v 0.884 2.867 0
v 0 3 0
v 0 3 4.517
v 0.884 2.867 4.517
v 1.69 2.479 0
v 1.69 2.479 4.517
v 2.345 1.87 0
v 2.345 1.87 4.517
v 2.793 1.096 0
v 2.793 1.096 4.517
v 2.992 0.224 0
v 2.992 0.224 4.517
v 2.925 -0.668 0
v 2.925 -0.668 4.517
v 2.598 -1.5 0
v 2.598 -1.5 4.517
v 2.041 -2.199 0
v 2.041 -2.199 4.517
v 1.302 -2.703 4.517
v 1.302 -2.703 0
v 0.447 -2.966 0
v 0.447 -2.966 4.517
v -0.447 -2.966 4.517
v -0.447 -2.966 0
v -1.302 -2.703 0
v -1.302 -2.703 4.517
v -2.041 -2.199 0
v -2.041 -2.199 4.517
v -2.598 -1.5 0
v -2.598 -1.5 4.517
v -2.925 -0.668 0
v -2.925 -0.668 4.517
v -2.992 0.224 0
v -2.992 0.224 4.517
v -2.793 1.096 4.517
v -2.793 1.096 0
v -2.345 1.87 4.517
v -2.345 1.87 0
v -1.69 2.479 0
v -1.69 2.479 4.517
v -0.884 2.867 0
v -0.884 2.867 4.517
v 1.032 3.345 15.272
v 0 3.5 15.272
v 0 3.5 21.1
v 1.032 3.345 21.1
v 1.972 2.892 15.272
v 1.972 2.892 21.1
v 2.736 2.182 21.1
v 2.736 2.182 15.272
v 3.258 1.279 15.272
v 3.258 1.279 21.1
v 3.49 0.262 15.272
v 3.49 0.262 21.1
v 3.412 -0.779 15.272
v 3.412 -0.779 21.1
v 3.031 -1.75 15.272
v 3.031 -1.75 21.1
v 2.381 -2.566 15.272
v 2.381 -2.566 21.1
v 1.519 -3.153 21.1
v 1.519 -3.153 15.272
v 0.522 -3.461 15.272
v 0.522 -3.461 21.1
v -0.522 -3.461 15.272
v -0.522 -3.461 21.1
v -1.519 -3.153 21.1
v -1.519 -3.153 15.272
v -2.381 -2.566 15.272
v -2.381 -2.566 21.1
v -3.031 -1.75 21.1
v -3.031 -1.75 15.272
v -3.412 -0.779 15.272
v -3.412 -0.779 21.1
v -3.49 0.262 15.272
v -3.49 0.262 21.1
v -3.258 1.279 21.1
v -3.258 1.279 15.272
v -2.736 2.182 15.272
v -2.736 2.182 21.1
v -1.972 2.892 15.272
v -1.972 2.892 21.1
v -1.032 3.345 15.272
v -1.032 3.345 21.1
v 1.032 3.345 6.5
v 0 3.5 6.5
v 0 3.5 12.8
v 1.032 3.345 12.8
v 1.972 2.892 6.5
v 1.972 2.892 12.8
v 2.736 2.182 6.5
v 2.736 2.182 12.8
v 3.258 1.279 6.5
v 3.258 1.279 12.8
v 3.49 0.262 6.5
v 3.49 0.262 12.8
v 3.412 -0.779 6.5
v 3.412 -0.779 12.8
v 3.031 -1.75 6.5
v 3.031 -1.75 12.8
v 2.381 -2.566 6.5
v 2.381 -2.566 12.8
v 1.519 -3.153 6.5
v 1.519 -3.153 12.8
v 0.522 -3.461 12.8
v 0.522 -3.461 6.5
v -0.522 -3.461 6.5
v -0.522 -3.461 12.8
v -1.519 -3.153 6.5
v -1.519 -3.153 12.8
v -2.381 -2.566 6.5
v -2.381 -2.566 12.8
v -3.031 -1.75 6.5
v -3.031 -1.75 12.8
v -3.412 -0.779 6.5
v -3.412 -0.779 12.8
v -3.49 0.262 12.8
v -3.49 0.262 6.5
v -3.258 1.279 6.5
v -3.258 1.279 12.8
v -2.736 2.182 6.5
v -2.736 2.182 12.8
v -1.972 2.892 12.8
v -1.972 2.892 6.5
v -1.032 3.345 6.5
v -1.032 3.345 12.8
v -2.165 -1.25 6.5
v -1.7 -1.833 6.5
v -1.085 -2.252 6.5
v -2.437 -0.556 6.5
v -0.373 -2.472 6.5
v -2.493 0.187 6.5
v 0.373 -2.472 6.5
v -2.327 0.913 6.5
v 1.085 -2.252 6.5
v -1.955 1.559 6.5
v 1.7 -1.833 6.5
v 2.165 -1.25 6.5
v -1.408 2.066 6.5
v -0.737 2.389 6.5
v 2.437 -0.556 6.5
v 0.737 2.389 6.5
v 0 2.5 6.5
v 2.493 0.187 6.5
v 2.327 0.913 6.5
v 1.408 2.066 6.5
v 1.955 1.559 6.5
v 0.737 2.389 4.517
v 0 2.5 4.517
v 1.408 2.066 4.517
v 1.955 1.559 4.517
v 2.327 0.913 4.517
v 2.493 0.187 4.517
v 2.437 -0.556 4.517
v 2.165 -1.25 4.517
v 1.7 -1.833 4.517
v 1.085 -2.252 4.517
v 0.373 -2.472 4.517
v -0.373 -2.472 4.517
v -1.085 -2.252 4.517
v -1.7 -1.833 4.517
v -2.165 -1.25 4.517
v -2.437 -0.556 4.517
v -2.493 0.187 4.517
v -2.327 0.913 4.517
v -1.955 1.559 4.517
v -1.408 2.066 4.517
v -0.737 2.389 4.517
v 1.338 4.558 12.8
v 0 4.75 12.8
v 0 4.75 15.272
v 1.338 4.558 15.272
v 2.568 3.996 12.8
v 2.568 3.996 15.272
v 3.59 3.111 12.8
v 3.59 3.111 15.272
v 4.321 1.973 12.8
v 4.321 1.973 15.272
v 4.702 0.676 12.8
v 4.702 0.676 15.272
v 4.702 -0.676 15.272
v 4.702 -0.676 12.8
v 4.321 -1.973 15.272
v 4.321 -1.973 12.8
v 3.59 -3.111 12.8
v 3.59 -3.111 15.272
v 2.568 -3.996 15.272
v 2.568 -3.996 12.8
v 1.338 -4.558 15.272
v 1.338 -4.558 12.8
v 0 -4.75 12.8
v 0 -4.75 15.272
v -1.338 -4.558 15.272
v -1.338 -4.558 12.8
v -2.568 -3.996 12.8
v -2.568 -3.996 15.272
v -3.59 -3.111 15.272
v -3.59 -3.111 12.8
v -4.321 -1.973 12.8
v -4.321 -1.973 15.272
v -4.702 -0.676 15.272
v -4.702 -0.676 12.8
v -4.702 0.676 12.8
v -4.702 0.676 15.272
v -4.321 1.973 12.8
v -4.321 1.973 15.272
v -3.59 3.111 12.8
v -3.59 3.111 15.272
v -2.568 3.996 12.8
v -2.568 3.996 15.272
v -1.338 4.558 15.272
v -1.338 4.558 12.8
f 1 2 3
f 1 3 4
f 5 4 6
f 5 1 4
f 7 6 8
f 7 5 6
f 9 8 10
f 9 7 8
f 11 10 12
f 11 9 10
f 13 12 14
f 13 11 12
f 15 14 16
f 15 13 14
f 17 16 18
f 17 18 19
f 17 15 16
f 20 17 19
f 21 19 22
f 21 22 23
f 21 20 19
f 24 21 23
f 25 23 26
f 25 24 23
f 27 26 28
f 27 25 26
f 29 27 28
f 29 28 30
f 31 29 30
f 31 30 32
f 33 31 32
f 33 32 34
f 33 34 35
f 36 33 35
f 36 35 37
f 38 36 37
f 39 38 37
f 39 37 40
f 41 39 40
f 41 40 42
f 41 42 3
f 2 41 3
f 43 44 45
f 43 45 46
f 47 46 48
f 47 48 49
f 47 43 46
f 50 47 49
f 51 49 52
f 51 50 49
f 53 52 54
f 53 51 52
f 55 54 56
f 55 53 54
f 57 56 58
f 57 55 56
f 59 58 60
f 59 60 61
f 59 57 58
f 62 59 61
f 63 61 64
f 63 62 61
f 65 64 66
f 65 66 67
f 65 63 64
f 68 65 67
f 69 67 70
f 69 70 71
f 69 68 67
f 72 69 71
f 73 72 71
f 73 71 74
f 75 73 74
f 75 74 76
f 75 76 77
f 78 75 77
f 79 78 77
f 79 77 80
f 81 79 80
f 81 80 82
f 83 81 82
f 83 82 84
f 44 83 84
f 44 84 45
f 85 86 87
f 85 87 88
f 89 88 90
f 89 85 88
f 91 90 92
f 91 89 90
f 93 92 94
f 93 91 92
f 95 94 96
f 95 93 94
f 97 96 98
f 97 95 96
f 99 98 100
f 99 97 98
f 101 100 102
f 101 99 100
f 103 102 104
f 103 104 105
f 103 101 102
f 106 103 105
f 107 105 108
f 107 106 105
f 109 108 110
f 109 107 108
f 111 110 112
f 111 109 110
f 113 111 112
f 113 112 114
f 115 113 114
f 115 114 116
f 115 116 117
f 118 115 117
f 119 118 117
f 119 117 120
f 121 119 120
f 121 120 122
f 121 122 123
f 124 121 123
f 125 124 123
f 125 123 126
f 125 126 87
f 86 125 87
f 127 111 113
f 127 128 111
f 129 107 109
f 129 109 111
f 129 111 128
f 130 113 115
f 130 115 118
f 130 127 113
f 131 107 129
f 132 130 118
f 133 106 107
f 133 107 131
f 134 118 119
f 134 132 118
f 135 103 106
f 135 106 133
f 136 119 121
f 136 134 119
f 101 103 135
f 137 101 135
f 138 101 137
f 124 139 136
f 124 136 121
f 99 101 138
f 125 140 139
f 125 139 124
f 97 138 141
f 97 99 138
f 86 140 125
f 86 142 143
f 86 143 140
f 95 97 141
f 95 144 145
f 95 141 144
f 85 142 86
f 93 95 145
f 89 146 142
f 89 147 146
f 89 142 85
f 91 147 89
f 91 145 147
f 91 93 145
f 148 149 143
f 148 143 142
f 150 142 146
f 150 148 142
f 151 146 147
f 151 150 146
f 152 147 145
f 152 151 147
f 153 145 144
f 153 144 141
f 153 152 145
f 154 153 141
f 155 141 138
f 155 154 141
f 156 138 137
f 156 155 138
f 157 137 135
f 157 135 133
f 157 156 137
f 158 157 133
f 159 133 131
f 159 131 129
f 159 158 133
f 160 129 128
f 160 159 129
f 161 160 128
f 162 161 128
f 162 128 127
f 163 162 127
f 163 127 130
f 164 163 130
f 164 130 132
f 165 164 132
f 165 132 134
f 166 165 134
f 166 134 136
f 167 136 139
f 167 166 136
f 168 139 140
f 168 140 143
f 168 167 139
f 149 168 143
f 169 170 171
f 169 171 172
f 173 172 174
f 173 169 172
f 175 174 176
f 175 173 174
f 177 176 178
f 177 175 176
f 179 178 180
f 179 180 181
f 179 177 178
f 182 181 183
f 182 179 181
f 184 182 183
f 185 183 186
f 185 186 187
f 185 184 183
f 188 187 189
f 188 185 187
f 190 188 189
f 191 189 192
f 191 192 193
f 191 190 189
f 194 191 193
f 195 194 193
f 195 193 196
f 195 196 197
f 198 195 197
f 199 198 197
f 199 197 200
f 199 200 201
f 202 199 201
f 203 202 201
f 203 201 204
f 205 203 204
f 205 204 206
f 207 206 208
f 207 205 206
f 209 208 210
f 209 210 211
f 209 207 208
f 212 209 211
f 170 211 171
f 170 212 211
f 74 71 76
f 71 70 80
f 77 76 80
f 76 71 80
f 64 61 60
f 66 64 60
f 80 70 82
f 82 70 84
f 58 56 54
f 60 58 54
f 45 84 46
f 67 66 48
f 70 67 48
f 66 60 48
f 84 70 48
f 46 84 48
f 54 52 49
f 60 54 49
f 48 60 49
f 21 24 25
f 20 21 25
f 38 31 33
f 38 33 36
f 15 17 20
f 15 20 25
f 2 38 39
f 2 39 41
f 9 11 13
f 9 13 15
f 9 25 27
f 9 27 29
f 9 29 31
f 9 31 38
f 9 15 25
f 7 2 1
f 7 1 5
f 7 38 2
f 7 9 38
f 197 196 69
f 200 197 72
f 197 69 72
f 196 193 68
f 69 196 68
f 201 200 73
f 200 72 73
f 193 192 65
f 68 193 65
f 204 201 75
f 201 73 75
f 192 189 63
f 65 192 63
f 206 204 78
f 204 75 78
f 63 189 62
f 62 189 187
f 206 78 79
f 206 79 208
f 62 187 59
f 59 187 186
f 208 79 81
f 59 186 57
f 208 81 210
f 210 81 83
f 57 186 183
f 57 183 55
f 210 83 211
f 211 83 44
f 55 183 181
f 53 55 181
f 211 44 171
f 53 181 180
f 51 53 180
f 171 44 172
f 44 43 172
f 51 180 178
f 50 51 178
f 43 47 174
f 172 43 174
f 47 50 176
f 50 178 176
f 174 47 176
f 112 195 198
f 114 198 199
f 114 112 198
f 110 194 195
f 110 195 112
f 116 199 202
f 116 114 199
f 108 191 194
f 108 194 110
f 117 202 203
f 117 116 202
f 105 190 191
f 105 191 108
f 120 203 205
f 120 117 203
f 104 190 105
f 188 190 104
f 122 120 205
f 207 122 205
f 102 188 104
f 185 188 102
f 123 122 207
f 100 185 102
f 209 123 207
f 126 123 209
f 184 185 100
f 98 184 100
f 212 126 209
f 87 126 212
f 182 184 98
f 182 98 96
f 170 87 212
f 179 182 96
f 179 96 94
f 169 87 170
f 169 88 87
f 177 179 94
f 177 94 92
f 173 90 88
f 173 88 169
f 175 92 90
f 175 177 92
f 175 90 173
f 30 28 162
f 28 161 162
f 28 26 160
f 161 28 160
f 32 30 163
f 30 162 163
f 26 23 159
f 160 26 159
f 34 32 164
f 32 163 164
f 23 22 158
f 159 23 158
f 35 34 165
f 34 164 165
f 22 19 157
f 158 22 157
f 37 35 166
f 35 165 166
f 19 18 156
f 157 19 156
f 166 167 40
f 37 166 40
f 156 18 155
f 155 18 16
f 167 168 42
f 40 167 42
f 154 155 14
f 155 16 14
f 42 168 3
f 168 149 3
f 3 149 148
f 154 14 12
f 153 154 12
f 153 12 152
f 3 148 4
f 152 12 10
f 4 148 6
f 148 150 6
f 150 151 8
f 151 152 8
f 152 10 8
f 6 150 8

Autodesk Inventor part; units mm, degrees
ref_plane "YZ Plane" through (0, 0, 0) normal (1, 0, 0) x (0, 1, 0)
ref_plane "XZ Plane" through (0, 0, 0) normal (0, 1, 0) x (-1, 0, 0)
ref_plane "XY Plane" through (0, 0, 0) normal (0, 0, 1) x (1, 0, 0)
sketch "Sketch1" plane through (0, 0, 0) normal (1, 0, 0) x (0, 1, 0)
  line L0 (0, 21.1) -> (3.5, 21.1)
  line L1 (3.5, 21.1) -> (3.5, 15.2717)
  line L2 (3.5, 15.2717) -> (4.75, 15.2717)
  line L3 (4.75, 15.2717) -> (4.75, 12.8)
  line L4 (4.75, 12.8) -> (3.5, 12.8)
  line L5 (3.5, 12.8) -> (3.5, 6.5)
  line L6 (3.5, 6.5) -> (2.5, 6.5)
  line L7 (2.5, 6.5) -> (2.5, 4.517)
  line L8 (2.5, 4.517) -> (3, 4.517)
  line L9 (3, 4.517) -> (3, 0)
  line L10 (3, 0) -> (0, 0)
  line L11 (0, 21.1) -> (0, 0)
  dimension "d0" = 21.1
  dimension "d1" = 3
  dimension "d2" = 3.5
  dimension "d3" = 2.5
  dimension "d4" = 6.5
  dimension "d5" = 4.517
  dimension "d6" = 6.3
  dimension "d7" = 2.4717
  dimension "d8" = 4.75
revolve "Revolution1" add sketch "Sketch1" angle 360 about axis through (0, 0, 21.1) along (0, 0, -1)
properties part number "Button" material "Nylon 6/6"
